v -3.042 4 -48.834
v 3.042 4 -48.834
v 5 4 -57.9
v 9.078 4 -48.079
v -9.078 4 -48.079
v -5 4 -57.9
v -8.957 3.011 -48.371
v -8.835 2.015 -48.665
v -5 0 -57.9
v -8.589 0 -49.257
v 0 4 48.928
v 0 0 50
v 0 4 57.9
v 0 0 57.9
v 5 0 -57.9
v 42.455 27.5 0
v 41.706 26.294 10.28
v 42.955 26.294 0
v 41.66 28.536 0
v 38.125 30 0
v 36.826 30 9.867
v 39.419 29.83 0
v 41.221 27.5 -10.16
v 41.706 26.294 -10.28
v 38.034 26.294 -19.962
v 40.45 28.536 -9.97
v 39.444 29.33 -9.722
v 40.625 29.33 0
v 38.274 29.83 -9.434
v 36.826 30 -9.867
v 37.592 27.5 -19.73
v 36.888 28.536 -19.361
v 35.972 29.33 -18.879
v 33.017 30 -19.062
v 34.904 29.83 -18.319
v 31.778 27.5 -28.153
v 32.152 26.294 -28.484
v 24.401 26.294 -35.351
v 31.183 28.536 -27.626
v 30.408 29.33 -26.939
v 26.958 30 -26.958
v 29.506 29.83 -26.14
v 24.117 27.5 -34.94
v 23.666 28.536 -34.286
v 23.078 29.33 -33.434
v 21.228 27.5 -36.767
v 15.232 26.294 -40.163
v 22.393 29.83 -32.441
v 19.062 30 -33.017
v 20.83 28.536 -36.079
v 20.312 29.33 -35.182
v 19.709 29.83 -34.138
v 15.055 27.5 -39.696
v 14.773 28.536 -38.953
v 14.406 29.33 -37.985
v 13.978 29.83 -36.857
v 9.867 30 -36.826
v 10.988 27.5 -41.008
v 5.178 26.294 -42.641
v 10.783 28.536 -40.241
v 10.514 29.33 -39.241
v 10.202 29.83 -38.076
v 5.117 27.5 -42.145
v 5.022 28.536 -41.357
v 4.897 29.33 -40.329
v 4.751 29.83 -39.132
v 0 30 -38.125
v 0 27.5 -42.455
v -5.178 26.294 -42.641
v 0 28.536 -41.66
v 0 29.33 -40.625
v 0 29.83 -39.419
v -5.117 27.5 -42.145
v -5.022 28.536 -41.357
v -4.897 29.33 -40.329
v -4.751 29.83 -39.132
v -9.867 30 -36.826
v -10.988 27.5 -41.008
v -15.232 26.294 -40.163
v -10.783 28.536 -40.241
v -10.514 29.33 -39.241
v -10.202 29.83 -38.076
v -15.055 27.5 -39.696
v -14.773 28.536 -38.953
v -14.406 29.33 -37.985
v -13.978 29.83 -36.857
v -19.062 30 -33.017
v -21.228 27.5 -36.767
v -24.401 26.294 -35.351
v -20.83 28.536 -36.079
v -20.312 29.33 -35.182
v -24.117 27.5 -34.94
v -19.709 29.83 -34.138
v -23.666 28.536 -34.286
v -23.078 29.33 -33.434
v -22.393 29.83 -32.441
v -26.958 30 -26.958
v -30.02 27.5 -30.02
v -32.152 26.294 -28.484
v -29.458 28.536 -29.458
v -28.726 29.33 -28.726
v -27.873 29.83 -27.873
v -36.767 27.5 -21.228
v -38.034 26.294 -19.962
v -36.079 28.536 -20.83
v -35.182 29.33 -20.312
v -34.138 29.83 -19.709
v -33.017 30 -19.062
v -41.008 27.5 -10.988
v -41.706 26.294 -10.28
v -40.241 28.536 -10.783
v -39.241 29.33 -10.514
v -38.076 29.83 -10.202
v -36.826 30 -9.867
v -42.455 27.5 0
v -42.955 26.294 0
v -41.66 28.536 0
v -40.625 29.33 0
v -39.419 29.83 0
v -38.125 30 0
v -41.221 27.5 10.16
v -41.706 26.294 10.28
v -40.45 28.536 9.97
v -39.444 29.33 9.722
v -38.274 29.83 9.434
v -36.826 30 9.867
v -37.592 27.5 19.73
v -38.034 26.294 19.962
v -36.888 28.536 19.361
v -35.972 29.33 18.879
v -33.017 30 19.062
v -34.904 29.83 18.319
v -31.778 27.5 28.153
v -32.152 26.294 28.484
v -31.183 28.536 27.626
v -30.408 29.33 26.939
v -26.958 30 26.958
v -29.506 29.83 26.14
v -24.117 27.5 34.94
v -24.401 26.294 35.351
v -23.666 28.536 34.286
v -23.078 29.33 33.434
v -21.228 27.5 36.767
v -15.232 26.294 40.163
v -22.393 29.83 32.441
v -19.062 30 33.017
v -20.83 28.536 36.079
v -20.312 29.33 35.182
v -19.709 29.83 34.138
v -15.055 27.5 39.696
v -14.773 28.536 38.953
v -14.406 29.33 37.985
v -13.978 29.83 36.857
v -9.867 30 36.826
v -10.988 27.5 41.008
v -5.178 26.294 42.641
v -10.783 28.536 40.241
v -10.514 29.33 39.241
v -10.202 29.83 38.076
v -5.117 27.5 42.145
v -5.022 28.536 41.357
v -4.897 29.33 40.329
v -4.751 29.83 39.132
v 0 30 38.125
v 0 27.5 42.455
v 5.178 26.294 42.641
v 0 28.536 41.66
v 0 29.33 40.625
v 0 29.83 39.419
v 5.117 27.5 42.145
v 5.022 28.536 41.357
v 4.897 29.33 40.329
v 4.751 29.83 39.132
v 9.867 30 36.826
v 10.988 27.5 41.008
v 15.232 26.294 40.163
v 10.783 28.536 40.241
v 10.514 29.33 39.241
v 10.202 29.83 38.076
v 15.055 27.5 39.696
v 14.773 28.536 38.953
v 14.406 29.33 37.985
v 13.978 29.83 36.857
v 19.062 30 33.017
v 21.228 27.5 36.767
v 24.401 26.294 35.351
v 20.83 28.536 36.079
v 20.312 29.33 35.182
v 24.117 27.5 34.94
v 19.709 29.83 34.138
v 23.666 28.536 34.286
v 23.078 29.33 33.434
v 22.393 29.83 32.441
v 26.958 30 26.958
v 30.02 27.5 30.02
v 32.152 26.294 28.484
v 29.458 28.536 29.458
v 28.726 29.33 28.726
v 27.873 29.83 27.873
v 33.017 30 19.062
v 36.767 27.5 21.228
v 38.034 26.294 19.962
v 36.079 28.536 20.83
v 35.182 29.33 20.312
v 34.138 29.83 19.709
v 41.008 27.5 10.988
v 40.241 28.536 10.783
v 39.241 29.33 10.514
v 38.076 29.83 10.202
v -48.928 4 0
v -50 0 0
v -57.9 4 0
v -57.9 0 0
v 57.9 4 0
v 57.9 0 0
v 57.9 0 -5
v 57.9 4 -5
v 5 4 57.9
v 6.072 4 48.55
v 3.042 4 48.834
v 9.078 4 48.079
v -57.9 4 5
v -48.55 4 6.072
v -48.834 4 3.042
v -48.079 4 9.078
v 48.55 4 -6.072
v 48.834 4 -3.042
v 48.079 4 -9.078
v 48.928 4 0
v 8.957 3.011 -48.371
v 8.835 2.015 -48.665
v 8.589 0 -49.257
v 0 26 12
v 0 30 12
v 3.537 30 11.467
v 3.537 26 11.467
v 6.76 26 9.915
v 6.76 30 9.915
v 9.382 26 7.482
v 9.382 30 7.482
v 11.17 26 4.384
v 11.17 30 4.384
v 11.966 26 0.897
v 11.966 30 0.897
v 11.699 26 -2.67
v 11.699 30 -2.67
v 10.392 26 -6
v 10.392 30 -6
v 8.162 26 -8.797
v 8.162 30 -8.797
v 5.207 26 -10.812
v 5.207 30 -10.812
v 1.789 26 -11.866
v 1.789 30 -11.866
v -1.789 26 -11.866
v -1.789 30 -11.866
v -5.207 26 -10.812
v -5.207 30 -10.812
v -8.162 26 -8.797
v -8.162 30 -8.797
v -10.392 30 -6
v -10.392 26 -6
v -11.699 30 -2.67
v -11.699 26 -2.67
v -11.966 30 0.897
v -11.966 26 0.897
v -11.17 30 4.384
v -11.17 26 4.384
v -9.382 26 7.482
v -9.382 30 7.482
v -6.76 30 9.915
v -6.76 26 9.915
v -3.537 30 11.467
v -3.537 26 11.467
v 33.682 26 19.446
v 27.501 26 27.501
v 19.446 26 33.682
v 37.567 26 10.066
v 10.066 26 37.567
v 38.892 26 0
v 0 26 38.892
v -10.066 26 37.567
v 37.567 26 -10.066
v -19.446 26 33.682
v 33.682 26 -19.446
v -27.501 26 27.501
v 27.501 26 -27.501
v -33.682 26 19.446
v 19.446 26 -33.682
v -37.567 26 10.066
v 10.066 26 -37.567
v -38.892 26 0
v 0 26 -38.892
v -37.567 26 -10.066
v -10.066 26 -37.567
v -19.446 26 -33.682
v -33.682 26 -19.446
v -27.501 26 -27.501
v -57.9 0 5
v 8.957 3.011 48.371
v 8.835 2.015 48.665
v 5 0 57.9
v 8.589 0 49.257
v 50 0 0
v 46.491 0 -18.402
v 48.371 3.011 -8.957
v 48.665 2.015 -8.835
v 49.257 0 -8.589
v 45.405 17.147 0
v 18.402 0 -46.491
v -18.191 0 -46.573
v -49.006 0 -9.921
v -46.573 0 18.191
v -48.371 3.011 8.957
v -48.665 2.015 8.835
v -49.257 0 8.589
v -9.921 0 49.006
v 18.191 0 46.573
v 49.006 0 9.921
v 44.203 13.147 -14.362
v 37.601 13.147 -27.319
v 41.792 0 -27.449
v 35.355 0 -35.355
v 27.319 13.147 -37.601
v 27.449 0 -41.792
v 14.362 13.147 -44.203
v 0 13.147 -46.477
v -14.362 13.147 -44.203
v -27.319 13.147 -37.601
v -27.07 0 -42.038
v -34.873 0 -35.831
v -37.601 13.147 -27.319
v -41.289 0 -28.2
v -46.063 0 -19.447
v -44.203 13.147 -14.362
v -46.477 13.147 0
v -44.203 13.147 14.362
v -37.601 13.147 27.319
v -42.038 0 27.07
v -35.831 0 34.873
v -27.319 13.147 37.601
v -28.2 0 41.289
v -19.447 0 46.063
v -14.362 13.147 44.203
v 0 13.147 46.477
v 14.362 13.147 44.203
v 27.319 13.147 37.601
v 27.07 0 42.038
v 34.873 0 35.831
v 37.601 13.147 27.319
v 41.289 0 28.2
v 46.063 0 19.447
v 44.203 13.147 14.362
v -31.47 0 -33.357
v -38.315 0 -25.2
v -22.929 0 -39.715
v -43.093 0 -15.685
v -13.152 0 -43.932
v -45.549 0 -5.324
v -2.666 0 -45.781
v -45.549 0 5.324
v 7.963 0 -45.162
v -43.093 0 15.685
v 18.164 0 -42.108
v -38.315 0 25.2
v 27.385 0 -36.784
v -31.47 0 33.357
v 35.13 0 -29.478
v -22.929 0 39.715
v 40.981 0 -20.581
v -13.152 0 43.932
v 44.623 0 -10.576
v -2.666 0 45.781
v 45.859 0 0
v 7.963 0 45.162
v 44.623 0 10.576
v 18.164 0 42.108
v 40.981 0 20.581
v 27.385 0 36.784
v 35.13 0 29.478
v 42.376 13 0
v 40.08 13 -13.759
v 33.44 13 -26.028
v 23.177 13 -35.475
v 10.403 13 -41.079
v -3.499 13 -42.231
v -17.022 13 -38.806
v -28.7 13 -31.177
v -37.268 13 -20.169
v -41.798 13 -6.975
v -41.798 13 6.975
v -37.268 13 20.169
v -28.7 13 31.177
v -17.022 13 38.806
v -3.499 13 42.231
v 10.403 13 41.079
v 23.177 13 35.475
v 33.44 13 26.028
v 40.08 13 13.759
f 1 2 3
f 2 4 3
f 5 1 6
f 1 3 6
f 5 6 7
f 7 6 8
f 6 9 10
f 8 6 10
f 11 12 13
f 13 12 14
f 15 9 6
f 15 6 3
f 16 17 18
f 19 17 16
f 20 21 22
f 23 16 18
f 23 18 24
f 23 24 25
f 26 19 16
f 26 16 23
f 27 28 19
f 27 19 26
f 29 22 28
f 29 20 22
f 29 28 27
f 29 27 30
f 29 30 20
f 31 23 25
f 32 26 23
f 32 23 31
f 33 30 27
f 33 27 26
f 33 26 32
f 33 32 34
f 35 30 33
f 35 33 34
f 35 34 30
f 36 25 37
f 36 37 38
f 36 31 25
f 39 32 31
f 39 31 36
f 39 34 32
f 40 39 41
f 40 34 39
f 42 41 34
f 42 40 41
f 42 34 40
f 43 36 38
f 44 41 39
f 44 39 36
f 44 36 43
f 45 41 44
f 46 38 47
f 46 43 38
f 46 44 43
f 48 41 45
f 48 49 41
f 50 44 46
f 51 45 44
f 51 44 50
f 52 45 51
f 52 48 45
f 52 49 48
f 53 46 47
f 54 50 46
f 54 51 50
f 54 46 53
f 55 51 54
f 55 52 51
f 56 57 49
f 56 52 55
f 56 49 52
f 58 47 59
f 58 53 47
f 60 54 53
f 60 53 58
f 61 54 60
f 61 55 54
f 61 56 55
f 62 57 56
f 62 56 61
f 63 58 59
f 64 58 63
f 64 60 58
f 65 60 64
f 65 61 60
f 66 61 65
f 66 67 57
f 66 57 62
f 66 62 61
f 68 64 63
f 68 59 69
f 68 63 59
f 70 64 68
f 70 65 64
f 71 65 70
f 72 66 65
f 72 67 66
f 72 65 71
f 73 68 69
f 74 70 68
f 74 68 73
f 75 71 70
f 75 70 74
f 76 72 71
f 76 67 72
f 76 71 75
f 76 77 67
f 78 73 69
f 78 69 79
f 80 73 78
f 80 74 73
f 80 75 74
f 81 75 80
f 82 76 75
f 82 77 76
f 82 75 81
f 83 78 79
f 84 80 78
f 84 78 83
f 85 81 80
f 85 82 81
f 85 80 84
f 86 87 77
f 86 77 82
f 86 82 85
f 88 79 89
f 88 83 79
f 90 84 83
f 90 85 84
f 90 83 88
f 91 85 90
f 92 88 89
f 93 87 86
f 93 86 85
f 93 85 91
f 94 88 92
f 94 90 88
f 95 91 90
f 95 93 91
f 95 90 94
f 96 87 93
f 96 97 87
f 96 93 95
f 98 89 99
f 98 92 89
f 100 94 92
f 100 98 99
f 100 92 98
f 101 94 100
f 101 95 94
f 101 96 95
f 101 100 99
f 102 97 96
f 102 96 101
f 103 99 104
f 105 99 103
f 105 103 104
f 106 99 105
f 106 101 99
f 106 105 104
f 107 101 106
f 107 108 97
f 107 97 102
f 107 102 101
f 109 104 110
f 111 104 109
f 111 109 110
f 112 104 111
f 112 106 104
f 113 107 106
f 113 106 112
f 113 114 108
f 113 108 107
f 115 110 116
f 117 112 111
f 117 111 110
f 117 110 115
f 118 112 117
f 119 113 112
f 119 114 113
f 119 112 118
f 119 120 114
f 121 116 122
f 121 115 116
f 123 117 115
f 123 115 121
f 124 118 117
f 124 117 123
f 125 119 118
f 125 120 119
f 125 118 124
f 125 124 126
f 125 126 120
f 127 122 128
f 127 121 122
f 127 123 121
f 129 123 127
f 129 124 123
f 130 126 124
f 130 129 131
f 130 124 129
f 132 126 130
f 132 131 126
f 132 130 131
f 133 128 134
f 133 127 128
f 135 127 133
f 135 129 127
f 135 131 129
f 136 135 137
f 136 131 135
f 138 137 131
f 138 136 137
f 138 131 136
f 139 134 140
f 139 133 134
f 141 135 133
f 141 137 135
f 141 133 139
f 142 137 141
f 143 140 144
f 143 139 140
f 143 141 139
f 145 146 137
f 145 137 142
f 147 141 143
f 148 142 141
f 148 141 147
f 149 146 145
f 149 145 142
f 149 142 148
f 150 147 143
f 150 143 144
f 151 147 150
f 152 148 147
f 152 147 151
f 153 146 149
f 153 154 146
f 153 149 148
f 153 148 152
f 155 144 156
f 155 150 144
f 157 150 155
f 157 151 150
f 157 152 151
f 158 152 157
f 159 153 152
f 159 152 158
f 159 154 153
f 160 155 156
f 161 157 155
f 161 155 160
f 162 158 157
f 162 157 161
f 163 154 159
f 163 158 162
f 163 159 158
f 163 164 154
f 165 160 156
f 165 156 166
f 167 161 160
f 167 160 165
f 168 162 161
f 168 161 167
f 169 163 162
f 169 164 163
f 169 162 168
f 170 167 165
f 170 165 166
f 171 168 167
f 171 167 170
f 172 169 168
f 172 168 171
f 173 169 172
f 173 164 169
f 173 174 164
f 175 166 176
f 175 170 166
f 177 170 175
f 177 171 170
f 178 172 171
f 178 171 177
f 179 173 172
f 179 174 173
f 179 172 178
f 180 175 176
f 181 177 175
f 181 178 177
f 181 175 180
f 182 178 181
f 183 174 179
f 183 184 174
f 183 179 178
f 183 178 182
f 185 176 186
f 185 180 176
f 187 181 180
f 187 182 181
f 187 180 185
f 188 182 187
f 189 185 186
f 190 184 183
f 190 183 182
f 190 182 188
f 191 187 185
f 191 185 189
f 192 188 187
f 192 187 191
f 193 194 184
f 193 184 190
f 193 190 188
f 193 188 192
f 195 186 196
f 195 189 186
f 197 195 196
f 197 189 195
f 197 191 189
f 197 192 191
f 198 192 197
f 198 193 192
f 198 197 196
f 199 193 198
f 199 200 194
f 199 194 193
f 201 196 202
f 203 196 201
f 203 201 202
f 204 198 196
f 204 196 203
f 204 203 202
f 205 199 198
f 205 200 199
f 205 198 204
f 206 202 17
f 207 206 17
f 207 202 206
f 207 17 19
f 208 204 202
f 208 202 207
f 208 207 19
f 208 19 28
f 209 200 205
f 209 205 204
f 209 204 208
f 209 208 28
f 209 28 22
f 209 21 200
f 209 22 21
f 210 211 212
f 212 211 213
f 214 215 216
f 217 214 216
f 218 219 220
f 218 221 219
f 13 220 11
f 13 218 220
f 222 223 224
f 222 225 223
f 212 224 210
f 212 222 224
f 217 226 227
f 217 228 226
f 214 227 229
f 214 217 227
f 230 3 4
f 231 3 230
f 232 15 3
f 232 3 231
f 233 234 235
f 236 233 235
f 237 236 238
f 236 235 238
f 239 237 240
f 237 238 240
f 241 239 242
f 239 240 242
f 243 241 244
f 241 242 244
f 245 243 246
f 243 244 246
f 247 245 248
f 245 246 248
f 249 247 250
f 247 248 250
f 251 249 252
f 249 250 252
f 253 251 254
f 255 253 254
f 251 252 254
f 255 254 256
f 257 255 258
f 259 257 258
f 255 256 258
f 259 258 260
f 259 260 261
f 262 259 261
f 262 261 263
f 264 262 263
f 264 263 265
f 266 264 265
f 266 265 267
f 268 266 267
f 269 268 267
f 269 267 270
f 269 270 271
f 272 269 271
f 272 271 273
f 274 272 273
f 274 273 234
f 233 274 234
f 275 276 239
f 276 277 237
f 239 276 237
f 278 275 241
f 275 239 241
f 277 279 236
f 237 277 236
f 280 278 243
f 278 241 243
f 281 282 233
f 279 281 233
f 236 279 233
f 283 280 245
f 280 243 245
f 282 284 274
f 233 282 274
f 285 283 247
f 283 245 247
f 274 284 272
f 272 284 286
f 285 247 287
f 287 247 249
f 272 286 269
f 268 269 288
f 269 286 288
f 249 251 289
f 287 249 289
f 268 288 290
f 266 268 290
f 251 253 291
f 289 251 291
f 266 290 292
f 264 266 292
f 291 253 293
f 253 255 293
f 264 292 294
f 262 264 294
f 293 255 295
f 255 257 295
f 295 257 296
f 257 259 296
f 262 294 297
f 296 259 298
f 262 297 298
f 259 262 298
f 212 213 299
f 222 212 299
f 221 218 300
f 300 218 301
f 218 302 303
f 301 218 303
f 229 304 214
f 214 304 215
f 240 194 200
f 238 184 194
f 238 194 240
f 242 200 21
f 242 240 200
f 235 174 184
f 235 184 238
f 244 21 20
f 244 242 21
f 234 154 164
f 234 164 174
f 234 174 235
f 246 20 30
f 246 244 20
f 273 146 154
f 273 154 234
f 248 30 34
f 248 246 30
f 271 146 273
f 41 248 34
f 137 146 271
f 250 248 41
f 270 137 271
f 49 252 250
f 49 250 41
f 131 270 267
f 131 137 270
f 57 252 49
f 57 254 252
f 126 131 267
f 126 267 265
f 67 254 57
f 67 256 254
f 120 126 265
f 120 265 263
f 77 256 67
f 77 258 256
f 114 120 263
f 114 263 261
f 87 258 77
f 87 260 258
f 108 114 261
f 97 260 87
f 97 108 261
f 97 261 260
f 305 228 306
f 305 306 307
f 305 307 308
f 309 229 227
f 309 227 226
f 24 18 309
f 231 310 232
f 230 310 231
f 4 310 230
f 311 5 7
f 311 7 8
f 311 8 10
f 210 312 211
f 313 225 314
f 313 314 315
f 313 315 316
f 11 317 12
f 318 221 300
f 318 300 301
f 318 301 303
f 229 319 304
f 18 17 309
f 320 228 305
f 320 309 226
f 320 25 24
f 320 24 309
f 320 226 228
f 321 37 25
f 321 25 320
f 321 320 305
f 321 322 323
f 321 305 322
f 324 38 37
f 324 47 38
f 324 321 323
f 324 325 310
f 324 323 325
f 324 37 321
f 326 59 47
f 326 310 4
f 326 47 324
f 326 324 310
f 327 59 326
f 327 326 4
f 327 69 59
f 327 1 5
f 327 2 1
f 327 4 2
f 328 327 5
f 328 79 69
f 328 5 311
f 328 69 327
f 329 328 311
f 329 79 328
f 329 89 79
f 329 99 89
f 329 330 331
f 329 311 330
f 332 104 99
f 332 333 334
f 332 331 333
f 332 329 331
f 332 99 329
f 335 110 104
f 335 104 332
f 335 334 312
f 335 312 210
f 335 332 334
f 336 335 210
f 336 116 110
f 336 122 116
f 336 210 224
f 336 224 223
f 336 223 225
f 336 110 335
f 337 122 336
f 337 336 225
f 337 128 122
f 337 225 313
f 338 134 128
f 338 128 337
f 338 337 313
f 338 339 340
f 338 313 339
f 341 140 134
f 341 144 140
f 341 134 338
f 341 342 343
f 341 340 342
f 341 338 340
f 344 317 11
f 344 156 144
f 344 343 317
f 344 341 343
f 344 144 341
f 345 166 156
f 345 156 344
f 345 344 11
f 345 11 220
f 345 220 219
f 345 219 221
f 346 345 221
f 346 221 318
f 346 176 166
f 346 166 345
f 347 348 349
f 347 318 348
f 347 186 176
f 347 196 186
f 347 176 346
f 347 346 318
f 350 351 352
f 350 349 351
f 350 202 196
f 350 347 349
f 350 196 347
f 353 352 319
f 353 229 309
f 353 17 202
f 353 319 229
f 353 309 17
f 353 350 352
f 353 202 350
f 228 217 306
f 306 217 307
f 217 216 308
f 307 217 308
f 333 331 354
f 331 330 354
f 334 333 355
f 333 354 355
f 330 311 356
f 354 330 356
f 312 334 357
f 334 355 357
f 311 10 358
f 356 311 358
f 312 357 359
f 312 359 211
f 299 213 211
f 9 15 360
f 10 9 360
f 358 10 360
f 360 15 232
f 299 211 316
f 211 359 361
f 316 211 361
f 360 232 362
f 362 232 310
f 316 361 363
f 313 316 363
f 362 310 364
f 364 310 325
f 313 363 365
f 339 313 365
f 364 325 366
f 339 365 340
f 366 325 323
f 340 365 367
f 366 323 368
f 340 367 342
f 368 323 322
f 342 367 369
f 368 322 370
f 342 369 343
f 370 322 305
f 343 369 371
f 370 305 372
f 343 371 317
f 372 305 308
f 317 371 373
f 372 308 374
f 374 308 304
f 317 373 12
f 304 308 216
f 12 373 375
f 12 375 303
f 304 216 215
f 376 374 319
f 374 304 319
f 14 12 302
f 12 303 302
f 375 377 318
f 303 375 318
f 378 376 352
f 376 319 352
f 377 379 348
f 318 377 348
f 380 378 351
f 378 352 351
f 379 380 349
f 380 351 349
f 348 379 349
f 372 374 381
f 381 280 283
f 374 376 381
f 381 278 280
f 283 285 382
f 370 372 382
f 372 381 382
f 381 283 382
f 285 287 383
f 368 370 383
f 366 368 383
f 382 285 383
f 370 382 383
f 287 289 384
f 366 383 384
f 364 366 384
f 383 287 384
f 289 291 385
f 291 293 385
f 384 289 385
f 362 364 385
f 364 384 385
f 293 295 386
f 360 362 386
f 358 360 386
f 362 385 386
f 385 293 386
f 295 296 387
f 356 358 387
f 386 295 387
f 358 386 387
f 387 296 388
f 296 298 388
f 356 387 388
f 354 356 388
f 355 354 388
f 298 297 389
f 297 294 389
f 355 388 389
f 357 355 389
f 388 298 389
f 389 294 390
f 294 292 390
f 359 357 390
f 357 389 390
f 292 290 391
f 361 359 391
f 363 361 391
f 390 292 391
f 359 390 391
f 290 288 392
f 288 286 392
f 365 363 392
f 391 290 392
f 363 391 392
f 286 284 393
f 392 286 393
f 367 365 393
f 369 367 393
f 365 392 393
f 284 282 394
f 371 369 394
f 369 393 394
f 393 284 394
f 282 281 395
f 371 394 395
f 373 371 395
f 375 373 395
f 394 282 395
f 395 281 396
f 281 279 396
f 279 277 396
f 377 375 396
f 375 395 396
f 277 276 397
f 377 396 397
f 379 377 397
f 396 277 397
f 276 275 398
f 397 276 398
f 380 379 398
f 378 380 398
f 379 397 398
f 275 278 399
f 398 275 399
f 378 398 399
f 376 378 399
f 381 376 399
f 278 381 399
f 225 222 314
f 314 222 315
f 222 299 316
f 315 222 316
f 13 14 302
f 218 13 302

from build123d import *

# Parameters (mm, degrees)
CROQUIS3_W              = 50
CROQUIS3_H              = 30
VACIADO1_T              = -4
CORTAR_EXTRUIR1_REACH   = 78.811
CROQUIS7_R              = 12
REDONDEO1_R             = 5
SALIENTE_EXTRUIR1_DEPTH = 4
MATRIZC10_COUNT         = 4


with BuildPart() as part:
    # Croquis3 → Revolución1 (revolve)
    with BuildSketch(Plane(origin=(0, 0, 0), x_dir=(0, 0, -1), z_dir=(1, 0, 0)), mode=Mode.PRIVATE) as revoluci_n1_sk:
        with Locations((-25, 15)):
            Rectangle(CROQUIS3_W, CROQUIS3_H)
    revolve(revoluci_n1_sk.sketch.rotate(Axis((0, 0, 0), (0, 1, 0)), 180), axis=Axis((0, 0, 0), (0, 1, 0)))

    # Croquis6 → Cortar-Revolución1 (revolve, cut)
    with BuildSketch(Plane.XY, mode=Mode.PRIVATE) as cortar_revoluci_n1_sk:
        Polygon((-50, 30), (-50, 0), (-41.961524227, 30), align=None)
    revolve(cortar_revoluci_n1_sk.sketch.rotate(Axis((0, -970, 0), (0, 1, 0)), 180), axis=Axis((0, -970, 0), (0, 1, 0)), mode=Mode.SUBTRACT)

    # Vaciado1
    vaciado1_openings = [part.faces().sort_by_distance(p)[0] for p in [
        (0, 0, 0),
    ]]
    offset(amount=VACIADO1_T, openings=vaciado1_openings, kind=Kind.INTERSECTION)

    # Croquis7 → Cortar-Extruir1 (cut, up to next)
    with BuildSketch(Plane(origin=(0, 30, 0), x_dir=(1, 0, 0), z_dir=(0, 1, 0)), mode=Mode.PRIVATE) as cortar_extruir1_sk1:
        with Locations(Location((0, 0, 0), (0, 0, 270))):
            Circle(CROQUIS7_R)
    cortar_extruir1_tool1 = extrude(cortar_extruir1_sk1.sketch, amount=-CORTAR_EXTRUIR1_REACH, mode=Mode.PRIVATE) & part.part
    add(cortar_extruir1_tool1.solids().sort_by_distance((0, 30, 0))[0], mode=Mode.SUBTRACT)

    # Redondeo1
    redondeo1_edges = [part.edges().sort_by_distance(p)[0] for p in [
        (-41.961524227, 30, 0),
    ]]
    fillet(redondeo1_edges, radius=REDONDEO1_R)

    # Croquis8 → Saliente-Extruir1 (add)
    with BuildSketch(Plane(origin=(0, 0, 0), x_dir=(-1, 0, 0), z_dir=(0, -1, 0))):
        Polygon((0, 57.899543771), (5, 57.899543771), (10, 45.858895278), (0, 45.858895278), align=None)
    saliente_extruir1 = extrude(amount=-SALIENTE_EXTRUIR1_DEPTH)

    # Simetría1: Saliente-Extruir1 across plane
    add(saliente_extruir1.mirror(Plane(origin=(0, 4, -45.858895278), x_dir=(0, 0, 1), z_dir=(1, 0, 0))))

    # MatrizC10: Saliente-Extruir1 ×4 about axis
    matrizc10_axis = Axis((0, 0, 0), (0, 1, 0))
    for i in range(1, MATRIZC10_COUNT):
        add(saliente_extruir1.rotate(matrizc10_axis, i * 360 / MATRIZC10_COUNT))


solid = part.part
